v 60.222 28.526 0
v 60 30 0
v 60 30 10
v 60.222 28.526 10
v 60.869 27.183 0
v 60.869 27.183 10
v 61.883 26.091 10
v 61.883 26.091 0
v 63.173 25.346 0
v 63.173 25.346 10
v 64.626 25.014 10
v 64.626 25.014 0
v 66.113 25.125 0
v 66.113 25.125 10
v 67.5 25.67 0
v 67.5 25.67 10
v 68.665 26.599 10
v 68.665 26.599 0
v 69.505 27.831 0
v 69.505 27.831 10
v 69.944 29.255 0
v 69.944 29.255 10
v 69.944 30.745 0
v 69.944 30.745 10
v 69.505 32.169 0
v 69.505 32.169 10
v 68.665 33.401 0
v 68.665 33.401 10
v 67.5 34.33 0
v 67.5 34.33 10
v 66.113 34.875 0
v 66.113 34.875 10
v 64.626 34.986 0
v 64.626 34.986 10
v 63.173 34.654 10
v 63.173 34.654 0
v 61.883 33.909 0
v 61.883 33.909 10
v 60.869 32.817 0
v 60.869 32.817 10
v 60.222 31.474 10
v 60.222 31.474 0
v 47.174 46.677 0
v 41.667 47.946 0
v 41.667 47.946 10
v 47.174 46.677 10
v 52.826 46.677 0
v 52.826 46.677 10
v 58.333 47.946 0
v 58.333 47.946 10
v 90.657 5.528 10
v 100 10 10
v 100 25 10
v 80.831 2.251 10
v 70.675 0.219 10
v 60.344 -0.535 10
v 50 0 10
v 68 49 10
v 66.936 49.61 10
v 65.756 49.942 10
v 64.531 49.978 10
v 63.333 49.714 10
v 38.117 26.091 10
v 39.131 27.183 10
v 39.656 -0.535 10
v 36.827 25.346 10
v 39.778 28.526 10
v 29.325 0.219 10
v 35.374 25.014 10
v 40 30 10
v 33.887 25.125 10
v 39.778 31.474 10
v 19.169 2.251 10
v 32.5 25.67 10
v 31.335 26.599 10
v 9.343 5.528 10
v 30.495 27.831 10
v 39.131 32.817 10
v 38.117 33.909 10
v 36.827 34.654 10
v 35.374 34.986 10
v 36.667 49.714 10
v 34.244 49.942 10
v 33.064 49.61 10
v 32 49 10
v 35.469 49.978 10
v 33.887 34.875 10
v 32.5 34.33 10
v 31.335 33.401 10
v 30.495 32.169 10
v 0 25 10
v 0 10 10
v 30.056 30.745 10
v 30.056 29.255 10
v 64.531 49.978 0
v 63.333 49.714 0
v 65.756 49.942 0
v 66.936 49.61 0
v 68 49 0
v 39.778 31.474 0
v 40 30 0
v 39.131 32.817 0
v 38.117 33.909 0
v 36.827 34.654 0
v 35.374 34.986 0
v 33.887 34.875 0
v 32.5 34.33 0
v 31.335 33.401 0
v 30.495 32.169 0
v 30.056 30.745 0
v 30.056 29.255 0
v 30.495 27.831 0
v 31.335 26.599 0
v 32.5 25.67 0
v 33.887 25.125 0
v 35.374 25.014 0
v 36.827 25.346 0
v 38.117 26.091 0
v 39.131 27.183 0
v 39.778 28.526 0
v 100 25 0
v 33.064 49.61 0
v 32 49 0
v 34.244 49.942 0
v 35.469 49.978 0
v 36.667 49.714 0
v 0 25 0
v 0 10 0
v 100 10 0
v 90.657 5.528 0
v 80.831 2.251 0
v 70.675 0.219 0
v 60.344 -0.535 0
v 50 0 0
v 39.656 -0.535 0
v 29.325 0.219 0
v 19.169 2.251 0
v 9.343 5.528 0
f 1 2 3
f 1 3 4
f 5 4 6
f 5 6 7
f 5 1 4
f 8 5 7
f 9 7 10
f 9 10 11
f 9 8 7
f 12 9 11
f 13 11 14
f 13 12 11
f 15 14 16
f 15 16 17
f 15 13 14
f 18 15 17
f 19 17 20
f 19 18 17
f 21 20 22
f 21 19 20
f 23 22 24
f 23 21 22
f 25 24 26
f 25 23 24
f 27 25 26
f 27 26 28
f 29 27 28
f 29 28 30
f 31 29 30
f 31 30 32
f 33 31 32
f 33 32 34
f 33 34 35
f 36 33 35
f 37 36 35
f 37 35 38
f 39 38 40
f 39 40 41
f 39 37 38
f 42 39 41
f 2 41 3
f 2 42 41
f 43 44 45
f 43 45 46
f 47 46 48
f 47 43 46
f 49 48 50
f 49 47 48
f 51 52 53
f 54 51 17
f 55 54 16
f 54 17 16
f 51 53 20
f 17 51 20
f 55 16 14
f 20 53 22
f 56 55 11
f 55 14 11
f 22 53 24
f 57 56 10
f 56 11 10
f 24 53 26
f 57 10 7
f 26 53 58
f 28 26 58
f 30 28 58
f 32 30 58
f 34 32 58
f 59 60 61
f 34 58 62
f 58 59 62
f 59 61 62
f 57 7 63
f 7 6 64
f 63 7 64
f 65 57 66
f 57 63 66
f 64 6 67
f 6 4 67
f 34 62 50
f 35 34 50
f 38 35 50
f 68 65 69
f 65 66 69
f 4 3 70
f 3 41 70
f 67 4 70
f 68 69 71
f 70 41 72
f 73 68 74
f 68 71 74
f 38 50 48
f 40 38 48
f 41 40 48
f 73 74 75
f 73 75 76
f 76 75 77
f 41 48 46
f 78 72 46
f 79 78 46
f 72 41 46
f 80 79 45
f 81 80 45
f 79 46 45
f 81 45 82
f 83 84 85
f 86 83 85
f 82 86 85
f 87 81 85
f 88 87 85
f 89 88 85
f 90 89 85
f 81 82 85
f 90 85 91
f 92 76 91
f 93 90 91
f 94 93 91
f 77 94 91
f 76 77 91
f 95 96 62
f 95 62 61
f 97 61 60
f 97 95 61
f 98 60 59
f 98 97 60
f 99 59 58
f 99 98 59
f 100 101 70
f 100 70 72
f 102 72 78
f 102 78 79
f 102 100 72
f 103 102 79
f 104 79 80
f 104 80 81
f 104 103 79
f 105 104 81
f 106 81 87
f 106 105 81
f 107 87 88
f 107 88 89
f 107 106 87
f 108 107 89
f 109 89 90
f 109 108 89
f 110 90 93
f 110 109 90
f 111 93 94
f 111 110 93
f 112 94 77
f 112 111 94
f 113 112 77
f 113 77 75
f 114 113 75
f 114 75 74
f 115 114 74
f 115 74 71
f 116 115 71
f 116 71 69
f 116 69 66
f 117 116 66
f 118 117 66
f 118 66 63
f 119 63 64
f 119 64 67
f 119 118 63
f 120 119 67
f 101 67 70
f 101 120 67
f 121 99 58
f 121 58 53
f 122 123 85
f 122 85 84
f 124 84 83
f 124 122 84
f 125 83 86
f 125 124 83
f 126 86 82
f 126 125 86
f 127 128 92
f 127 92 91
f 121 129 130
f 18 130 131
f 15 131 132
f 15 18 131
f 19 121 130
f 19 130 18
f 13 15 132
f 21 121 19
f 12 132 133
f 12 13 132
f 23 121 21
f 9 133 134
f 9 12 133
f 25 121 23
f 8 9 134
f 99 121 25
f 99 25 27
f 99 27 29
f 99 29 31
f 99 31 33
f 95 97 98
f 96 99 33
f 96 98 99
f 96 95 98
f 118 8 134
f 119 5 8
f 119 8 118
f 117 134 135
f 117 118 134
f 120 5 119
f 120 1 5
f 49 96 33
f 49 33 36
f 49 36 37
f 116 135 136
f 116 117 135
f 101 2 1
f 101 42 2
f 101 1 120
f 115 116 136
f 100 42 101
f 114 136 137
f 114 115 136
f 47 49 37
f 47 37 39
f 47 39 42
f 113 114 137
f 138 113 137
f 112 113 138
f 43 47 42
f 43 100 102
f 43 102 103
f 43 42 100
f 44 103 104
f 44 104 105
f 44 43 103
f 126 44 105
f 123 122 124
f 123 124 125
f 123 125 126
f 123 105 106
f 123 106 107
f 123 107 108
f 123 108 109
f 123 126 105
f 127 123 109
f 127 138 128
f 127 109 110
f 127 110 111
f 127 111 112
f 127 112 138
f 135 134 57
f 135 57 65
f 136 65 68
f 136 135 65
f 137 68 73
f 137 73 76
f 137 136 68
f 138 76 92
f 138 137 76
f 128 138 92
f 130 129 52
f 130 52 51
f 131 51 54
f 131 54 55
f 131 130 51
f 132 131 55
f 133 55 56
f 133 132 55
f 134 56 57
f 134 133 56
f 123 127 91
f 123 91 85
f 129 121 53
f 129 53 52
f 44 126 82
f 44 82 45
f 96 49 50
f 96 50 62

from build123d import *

# Parameters (mm, degrees)
SZKIC1_R                    = 5
DODANIE_WYCI_GNI_CIE1_DEPTH = 10


with BuildPart() as part:
    # Szkic1 → Dodanie-wyciągnięcie1 (new body)
    with BuildSketch(Plane.XY):
        with BuildLine():
            Line((0, 10), (0, 25))
            Line((0, 25), (31.999991312, 49.000008999))
            ThreePointArc((31.999991312, 49.000008999), (34.24374996, 49.942489803), (36.666669828, 49.714055442))
            Line((36.666669828, 49.714055442), (41.666653651, 47.946291102))
            ThreePointArc((41.666653651, 47.946291102), (50, 46.51651254), (58.333346349, 47.946291102))
            Line((58.333346349, 47.946291102), (63.333330172, 49.714055442))
            ThreePointArc((63.333330172, 49.714055442), (65.75625004, 49.942489803), (68.000008688, 49.000008999))
            Line((68.000008688, 49.000008999), (100, 25))
            Line((100, 25), (100, 10))
            ThreePointArc((100, 10), (75.784613824, 1.076930879), (50, 0))
            ThreePointArc((50, 0), (24.215386176, 1.076930879), (0, 10))
        make_face()
        with Locations((35, 30)):
            Circle(SZKIC1_R, mode=Mode.SUBTRACT)
        with Locations(Location((65, 30, 0), (0, 0, 180))):
            Circle(SZKIC1_R, mode=Mode.SUBTRACT)
    extrude(amount=DODANIE_WYCI_GNI_CIE1_DEPTH)


solid = part.part
